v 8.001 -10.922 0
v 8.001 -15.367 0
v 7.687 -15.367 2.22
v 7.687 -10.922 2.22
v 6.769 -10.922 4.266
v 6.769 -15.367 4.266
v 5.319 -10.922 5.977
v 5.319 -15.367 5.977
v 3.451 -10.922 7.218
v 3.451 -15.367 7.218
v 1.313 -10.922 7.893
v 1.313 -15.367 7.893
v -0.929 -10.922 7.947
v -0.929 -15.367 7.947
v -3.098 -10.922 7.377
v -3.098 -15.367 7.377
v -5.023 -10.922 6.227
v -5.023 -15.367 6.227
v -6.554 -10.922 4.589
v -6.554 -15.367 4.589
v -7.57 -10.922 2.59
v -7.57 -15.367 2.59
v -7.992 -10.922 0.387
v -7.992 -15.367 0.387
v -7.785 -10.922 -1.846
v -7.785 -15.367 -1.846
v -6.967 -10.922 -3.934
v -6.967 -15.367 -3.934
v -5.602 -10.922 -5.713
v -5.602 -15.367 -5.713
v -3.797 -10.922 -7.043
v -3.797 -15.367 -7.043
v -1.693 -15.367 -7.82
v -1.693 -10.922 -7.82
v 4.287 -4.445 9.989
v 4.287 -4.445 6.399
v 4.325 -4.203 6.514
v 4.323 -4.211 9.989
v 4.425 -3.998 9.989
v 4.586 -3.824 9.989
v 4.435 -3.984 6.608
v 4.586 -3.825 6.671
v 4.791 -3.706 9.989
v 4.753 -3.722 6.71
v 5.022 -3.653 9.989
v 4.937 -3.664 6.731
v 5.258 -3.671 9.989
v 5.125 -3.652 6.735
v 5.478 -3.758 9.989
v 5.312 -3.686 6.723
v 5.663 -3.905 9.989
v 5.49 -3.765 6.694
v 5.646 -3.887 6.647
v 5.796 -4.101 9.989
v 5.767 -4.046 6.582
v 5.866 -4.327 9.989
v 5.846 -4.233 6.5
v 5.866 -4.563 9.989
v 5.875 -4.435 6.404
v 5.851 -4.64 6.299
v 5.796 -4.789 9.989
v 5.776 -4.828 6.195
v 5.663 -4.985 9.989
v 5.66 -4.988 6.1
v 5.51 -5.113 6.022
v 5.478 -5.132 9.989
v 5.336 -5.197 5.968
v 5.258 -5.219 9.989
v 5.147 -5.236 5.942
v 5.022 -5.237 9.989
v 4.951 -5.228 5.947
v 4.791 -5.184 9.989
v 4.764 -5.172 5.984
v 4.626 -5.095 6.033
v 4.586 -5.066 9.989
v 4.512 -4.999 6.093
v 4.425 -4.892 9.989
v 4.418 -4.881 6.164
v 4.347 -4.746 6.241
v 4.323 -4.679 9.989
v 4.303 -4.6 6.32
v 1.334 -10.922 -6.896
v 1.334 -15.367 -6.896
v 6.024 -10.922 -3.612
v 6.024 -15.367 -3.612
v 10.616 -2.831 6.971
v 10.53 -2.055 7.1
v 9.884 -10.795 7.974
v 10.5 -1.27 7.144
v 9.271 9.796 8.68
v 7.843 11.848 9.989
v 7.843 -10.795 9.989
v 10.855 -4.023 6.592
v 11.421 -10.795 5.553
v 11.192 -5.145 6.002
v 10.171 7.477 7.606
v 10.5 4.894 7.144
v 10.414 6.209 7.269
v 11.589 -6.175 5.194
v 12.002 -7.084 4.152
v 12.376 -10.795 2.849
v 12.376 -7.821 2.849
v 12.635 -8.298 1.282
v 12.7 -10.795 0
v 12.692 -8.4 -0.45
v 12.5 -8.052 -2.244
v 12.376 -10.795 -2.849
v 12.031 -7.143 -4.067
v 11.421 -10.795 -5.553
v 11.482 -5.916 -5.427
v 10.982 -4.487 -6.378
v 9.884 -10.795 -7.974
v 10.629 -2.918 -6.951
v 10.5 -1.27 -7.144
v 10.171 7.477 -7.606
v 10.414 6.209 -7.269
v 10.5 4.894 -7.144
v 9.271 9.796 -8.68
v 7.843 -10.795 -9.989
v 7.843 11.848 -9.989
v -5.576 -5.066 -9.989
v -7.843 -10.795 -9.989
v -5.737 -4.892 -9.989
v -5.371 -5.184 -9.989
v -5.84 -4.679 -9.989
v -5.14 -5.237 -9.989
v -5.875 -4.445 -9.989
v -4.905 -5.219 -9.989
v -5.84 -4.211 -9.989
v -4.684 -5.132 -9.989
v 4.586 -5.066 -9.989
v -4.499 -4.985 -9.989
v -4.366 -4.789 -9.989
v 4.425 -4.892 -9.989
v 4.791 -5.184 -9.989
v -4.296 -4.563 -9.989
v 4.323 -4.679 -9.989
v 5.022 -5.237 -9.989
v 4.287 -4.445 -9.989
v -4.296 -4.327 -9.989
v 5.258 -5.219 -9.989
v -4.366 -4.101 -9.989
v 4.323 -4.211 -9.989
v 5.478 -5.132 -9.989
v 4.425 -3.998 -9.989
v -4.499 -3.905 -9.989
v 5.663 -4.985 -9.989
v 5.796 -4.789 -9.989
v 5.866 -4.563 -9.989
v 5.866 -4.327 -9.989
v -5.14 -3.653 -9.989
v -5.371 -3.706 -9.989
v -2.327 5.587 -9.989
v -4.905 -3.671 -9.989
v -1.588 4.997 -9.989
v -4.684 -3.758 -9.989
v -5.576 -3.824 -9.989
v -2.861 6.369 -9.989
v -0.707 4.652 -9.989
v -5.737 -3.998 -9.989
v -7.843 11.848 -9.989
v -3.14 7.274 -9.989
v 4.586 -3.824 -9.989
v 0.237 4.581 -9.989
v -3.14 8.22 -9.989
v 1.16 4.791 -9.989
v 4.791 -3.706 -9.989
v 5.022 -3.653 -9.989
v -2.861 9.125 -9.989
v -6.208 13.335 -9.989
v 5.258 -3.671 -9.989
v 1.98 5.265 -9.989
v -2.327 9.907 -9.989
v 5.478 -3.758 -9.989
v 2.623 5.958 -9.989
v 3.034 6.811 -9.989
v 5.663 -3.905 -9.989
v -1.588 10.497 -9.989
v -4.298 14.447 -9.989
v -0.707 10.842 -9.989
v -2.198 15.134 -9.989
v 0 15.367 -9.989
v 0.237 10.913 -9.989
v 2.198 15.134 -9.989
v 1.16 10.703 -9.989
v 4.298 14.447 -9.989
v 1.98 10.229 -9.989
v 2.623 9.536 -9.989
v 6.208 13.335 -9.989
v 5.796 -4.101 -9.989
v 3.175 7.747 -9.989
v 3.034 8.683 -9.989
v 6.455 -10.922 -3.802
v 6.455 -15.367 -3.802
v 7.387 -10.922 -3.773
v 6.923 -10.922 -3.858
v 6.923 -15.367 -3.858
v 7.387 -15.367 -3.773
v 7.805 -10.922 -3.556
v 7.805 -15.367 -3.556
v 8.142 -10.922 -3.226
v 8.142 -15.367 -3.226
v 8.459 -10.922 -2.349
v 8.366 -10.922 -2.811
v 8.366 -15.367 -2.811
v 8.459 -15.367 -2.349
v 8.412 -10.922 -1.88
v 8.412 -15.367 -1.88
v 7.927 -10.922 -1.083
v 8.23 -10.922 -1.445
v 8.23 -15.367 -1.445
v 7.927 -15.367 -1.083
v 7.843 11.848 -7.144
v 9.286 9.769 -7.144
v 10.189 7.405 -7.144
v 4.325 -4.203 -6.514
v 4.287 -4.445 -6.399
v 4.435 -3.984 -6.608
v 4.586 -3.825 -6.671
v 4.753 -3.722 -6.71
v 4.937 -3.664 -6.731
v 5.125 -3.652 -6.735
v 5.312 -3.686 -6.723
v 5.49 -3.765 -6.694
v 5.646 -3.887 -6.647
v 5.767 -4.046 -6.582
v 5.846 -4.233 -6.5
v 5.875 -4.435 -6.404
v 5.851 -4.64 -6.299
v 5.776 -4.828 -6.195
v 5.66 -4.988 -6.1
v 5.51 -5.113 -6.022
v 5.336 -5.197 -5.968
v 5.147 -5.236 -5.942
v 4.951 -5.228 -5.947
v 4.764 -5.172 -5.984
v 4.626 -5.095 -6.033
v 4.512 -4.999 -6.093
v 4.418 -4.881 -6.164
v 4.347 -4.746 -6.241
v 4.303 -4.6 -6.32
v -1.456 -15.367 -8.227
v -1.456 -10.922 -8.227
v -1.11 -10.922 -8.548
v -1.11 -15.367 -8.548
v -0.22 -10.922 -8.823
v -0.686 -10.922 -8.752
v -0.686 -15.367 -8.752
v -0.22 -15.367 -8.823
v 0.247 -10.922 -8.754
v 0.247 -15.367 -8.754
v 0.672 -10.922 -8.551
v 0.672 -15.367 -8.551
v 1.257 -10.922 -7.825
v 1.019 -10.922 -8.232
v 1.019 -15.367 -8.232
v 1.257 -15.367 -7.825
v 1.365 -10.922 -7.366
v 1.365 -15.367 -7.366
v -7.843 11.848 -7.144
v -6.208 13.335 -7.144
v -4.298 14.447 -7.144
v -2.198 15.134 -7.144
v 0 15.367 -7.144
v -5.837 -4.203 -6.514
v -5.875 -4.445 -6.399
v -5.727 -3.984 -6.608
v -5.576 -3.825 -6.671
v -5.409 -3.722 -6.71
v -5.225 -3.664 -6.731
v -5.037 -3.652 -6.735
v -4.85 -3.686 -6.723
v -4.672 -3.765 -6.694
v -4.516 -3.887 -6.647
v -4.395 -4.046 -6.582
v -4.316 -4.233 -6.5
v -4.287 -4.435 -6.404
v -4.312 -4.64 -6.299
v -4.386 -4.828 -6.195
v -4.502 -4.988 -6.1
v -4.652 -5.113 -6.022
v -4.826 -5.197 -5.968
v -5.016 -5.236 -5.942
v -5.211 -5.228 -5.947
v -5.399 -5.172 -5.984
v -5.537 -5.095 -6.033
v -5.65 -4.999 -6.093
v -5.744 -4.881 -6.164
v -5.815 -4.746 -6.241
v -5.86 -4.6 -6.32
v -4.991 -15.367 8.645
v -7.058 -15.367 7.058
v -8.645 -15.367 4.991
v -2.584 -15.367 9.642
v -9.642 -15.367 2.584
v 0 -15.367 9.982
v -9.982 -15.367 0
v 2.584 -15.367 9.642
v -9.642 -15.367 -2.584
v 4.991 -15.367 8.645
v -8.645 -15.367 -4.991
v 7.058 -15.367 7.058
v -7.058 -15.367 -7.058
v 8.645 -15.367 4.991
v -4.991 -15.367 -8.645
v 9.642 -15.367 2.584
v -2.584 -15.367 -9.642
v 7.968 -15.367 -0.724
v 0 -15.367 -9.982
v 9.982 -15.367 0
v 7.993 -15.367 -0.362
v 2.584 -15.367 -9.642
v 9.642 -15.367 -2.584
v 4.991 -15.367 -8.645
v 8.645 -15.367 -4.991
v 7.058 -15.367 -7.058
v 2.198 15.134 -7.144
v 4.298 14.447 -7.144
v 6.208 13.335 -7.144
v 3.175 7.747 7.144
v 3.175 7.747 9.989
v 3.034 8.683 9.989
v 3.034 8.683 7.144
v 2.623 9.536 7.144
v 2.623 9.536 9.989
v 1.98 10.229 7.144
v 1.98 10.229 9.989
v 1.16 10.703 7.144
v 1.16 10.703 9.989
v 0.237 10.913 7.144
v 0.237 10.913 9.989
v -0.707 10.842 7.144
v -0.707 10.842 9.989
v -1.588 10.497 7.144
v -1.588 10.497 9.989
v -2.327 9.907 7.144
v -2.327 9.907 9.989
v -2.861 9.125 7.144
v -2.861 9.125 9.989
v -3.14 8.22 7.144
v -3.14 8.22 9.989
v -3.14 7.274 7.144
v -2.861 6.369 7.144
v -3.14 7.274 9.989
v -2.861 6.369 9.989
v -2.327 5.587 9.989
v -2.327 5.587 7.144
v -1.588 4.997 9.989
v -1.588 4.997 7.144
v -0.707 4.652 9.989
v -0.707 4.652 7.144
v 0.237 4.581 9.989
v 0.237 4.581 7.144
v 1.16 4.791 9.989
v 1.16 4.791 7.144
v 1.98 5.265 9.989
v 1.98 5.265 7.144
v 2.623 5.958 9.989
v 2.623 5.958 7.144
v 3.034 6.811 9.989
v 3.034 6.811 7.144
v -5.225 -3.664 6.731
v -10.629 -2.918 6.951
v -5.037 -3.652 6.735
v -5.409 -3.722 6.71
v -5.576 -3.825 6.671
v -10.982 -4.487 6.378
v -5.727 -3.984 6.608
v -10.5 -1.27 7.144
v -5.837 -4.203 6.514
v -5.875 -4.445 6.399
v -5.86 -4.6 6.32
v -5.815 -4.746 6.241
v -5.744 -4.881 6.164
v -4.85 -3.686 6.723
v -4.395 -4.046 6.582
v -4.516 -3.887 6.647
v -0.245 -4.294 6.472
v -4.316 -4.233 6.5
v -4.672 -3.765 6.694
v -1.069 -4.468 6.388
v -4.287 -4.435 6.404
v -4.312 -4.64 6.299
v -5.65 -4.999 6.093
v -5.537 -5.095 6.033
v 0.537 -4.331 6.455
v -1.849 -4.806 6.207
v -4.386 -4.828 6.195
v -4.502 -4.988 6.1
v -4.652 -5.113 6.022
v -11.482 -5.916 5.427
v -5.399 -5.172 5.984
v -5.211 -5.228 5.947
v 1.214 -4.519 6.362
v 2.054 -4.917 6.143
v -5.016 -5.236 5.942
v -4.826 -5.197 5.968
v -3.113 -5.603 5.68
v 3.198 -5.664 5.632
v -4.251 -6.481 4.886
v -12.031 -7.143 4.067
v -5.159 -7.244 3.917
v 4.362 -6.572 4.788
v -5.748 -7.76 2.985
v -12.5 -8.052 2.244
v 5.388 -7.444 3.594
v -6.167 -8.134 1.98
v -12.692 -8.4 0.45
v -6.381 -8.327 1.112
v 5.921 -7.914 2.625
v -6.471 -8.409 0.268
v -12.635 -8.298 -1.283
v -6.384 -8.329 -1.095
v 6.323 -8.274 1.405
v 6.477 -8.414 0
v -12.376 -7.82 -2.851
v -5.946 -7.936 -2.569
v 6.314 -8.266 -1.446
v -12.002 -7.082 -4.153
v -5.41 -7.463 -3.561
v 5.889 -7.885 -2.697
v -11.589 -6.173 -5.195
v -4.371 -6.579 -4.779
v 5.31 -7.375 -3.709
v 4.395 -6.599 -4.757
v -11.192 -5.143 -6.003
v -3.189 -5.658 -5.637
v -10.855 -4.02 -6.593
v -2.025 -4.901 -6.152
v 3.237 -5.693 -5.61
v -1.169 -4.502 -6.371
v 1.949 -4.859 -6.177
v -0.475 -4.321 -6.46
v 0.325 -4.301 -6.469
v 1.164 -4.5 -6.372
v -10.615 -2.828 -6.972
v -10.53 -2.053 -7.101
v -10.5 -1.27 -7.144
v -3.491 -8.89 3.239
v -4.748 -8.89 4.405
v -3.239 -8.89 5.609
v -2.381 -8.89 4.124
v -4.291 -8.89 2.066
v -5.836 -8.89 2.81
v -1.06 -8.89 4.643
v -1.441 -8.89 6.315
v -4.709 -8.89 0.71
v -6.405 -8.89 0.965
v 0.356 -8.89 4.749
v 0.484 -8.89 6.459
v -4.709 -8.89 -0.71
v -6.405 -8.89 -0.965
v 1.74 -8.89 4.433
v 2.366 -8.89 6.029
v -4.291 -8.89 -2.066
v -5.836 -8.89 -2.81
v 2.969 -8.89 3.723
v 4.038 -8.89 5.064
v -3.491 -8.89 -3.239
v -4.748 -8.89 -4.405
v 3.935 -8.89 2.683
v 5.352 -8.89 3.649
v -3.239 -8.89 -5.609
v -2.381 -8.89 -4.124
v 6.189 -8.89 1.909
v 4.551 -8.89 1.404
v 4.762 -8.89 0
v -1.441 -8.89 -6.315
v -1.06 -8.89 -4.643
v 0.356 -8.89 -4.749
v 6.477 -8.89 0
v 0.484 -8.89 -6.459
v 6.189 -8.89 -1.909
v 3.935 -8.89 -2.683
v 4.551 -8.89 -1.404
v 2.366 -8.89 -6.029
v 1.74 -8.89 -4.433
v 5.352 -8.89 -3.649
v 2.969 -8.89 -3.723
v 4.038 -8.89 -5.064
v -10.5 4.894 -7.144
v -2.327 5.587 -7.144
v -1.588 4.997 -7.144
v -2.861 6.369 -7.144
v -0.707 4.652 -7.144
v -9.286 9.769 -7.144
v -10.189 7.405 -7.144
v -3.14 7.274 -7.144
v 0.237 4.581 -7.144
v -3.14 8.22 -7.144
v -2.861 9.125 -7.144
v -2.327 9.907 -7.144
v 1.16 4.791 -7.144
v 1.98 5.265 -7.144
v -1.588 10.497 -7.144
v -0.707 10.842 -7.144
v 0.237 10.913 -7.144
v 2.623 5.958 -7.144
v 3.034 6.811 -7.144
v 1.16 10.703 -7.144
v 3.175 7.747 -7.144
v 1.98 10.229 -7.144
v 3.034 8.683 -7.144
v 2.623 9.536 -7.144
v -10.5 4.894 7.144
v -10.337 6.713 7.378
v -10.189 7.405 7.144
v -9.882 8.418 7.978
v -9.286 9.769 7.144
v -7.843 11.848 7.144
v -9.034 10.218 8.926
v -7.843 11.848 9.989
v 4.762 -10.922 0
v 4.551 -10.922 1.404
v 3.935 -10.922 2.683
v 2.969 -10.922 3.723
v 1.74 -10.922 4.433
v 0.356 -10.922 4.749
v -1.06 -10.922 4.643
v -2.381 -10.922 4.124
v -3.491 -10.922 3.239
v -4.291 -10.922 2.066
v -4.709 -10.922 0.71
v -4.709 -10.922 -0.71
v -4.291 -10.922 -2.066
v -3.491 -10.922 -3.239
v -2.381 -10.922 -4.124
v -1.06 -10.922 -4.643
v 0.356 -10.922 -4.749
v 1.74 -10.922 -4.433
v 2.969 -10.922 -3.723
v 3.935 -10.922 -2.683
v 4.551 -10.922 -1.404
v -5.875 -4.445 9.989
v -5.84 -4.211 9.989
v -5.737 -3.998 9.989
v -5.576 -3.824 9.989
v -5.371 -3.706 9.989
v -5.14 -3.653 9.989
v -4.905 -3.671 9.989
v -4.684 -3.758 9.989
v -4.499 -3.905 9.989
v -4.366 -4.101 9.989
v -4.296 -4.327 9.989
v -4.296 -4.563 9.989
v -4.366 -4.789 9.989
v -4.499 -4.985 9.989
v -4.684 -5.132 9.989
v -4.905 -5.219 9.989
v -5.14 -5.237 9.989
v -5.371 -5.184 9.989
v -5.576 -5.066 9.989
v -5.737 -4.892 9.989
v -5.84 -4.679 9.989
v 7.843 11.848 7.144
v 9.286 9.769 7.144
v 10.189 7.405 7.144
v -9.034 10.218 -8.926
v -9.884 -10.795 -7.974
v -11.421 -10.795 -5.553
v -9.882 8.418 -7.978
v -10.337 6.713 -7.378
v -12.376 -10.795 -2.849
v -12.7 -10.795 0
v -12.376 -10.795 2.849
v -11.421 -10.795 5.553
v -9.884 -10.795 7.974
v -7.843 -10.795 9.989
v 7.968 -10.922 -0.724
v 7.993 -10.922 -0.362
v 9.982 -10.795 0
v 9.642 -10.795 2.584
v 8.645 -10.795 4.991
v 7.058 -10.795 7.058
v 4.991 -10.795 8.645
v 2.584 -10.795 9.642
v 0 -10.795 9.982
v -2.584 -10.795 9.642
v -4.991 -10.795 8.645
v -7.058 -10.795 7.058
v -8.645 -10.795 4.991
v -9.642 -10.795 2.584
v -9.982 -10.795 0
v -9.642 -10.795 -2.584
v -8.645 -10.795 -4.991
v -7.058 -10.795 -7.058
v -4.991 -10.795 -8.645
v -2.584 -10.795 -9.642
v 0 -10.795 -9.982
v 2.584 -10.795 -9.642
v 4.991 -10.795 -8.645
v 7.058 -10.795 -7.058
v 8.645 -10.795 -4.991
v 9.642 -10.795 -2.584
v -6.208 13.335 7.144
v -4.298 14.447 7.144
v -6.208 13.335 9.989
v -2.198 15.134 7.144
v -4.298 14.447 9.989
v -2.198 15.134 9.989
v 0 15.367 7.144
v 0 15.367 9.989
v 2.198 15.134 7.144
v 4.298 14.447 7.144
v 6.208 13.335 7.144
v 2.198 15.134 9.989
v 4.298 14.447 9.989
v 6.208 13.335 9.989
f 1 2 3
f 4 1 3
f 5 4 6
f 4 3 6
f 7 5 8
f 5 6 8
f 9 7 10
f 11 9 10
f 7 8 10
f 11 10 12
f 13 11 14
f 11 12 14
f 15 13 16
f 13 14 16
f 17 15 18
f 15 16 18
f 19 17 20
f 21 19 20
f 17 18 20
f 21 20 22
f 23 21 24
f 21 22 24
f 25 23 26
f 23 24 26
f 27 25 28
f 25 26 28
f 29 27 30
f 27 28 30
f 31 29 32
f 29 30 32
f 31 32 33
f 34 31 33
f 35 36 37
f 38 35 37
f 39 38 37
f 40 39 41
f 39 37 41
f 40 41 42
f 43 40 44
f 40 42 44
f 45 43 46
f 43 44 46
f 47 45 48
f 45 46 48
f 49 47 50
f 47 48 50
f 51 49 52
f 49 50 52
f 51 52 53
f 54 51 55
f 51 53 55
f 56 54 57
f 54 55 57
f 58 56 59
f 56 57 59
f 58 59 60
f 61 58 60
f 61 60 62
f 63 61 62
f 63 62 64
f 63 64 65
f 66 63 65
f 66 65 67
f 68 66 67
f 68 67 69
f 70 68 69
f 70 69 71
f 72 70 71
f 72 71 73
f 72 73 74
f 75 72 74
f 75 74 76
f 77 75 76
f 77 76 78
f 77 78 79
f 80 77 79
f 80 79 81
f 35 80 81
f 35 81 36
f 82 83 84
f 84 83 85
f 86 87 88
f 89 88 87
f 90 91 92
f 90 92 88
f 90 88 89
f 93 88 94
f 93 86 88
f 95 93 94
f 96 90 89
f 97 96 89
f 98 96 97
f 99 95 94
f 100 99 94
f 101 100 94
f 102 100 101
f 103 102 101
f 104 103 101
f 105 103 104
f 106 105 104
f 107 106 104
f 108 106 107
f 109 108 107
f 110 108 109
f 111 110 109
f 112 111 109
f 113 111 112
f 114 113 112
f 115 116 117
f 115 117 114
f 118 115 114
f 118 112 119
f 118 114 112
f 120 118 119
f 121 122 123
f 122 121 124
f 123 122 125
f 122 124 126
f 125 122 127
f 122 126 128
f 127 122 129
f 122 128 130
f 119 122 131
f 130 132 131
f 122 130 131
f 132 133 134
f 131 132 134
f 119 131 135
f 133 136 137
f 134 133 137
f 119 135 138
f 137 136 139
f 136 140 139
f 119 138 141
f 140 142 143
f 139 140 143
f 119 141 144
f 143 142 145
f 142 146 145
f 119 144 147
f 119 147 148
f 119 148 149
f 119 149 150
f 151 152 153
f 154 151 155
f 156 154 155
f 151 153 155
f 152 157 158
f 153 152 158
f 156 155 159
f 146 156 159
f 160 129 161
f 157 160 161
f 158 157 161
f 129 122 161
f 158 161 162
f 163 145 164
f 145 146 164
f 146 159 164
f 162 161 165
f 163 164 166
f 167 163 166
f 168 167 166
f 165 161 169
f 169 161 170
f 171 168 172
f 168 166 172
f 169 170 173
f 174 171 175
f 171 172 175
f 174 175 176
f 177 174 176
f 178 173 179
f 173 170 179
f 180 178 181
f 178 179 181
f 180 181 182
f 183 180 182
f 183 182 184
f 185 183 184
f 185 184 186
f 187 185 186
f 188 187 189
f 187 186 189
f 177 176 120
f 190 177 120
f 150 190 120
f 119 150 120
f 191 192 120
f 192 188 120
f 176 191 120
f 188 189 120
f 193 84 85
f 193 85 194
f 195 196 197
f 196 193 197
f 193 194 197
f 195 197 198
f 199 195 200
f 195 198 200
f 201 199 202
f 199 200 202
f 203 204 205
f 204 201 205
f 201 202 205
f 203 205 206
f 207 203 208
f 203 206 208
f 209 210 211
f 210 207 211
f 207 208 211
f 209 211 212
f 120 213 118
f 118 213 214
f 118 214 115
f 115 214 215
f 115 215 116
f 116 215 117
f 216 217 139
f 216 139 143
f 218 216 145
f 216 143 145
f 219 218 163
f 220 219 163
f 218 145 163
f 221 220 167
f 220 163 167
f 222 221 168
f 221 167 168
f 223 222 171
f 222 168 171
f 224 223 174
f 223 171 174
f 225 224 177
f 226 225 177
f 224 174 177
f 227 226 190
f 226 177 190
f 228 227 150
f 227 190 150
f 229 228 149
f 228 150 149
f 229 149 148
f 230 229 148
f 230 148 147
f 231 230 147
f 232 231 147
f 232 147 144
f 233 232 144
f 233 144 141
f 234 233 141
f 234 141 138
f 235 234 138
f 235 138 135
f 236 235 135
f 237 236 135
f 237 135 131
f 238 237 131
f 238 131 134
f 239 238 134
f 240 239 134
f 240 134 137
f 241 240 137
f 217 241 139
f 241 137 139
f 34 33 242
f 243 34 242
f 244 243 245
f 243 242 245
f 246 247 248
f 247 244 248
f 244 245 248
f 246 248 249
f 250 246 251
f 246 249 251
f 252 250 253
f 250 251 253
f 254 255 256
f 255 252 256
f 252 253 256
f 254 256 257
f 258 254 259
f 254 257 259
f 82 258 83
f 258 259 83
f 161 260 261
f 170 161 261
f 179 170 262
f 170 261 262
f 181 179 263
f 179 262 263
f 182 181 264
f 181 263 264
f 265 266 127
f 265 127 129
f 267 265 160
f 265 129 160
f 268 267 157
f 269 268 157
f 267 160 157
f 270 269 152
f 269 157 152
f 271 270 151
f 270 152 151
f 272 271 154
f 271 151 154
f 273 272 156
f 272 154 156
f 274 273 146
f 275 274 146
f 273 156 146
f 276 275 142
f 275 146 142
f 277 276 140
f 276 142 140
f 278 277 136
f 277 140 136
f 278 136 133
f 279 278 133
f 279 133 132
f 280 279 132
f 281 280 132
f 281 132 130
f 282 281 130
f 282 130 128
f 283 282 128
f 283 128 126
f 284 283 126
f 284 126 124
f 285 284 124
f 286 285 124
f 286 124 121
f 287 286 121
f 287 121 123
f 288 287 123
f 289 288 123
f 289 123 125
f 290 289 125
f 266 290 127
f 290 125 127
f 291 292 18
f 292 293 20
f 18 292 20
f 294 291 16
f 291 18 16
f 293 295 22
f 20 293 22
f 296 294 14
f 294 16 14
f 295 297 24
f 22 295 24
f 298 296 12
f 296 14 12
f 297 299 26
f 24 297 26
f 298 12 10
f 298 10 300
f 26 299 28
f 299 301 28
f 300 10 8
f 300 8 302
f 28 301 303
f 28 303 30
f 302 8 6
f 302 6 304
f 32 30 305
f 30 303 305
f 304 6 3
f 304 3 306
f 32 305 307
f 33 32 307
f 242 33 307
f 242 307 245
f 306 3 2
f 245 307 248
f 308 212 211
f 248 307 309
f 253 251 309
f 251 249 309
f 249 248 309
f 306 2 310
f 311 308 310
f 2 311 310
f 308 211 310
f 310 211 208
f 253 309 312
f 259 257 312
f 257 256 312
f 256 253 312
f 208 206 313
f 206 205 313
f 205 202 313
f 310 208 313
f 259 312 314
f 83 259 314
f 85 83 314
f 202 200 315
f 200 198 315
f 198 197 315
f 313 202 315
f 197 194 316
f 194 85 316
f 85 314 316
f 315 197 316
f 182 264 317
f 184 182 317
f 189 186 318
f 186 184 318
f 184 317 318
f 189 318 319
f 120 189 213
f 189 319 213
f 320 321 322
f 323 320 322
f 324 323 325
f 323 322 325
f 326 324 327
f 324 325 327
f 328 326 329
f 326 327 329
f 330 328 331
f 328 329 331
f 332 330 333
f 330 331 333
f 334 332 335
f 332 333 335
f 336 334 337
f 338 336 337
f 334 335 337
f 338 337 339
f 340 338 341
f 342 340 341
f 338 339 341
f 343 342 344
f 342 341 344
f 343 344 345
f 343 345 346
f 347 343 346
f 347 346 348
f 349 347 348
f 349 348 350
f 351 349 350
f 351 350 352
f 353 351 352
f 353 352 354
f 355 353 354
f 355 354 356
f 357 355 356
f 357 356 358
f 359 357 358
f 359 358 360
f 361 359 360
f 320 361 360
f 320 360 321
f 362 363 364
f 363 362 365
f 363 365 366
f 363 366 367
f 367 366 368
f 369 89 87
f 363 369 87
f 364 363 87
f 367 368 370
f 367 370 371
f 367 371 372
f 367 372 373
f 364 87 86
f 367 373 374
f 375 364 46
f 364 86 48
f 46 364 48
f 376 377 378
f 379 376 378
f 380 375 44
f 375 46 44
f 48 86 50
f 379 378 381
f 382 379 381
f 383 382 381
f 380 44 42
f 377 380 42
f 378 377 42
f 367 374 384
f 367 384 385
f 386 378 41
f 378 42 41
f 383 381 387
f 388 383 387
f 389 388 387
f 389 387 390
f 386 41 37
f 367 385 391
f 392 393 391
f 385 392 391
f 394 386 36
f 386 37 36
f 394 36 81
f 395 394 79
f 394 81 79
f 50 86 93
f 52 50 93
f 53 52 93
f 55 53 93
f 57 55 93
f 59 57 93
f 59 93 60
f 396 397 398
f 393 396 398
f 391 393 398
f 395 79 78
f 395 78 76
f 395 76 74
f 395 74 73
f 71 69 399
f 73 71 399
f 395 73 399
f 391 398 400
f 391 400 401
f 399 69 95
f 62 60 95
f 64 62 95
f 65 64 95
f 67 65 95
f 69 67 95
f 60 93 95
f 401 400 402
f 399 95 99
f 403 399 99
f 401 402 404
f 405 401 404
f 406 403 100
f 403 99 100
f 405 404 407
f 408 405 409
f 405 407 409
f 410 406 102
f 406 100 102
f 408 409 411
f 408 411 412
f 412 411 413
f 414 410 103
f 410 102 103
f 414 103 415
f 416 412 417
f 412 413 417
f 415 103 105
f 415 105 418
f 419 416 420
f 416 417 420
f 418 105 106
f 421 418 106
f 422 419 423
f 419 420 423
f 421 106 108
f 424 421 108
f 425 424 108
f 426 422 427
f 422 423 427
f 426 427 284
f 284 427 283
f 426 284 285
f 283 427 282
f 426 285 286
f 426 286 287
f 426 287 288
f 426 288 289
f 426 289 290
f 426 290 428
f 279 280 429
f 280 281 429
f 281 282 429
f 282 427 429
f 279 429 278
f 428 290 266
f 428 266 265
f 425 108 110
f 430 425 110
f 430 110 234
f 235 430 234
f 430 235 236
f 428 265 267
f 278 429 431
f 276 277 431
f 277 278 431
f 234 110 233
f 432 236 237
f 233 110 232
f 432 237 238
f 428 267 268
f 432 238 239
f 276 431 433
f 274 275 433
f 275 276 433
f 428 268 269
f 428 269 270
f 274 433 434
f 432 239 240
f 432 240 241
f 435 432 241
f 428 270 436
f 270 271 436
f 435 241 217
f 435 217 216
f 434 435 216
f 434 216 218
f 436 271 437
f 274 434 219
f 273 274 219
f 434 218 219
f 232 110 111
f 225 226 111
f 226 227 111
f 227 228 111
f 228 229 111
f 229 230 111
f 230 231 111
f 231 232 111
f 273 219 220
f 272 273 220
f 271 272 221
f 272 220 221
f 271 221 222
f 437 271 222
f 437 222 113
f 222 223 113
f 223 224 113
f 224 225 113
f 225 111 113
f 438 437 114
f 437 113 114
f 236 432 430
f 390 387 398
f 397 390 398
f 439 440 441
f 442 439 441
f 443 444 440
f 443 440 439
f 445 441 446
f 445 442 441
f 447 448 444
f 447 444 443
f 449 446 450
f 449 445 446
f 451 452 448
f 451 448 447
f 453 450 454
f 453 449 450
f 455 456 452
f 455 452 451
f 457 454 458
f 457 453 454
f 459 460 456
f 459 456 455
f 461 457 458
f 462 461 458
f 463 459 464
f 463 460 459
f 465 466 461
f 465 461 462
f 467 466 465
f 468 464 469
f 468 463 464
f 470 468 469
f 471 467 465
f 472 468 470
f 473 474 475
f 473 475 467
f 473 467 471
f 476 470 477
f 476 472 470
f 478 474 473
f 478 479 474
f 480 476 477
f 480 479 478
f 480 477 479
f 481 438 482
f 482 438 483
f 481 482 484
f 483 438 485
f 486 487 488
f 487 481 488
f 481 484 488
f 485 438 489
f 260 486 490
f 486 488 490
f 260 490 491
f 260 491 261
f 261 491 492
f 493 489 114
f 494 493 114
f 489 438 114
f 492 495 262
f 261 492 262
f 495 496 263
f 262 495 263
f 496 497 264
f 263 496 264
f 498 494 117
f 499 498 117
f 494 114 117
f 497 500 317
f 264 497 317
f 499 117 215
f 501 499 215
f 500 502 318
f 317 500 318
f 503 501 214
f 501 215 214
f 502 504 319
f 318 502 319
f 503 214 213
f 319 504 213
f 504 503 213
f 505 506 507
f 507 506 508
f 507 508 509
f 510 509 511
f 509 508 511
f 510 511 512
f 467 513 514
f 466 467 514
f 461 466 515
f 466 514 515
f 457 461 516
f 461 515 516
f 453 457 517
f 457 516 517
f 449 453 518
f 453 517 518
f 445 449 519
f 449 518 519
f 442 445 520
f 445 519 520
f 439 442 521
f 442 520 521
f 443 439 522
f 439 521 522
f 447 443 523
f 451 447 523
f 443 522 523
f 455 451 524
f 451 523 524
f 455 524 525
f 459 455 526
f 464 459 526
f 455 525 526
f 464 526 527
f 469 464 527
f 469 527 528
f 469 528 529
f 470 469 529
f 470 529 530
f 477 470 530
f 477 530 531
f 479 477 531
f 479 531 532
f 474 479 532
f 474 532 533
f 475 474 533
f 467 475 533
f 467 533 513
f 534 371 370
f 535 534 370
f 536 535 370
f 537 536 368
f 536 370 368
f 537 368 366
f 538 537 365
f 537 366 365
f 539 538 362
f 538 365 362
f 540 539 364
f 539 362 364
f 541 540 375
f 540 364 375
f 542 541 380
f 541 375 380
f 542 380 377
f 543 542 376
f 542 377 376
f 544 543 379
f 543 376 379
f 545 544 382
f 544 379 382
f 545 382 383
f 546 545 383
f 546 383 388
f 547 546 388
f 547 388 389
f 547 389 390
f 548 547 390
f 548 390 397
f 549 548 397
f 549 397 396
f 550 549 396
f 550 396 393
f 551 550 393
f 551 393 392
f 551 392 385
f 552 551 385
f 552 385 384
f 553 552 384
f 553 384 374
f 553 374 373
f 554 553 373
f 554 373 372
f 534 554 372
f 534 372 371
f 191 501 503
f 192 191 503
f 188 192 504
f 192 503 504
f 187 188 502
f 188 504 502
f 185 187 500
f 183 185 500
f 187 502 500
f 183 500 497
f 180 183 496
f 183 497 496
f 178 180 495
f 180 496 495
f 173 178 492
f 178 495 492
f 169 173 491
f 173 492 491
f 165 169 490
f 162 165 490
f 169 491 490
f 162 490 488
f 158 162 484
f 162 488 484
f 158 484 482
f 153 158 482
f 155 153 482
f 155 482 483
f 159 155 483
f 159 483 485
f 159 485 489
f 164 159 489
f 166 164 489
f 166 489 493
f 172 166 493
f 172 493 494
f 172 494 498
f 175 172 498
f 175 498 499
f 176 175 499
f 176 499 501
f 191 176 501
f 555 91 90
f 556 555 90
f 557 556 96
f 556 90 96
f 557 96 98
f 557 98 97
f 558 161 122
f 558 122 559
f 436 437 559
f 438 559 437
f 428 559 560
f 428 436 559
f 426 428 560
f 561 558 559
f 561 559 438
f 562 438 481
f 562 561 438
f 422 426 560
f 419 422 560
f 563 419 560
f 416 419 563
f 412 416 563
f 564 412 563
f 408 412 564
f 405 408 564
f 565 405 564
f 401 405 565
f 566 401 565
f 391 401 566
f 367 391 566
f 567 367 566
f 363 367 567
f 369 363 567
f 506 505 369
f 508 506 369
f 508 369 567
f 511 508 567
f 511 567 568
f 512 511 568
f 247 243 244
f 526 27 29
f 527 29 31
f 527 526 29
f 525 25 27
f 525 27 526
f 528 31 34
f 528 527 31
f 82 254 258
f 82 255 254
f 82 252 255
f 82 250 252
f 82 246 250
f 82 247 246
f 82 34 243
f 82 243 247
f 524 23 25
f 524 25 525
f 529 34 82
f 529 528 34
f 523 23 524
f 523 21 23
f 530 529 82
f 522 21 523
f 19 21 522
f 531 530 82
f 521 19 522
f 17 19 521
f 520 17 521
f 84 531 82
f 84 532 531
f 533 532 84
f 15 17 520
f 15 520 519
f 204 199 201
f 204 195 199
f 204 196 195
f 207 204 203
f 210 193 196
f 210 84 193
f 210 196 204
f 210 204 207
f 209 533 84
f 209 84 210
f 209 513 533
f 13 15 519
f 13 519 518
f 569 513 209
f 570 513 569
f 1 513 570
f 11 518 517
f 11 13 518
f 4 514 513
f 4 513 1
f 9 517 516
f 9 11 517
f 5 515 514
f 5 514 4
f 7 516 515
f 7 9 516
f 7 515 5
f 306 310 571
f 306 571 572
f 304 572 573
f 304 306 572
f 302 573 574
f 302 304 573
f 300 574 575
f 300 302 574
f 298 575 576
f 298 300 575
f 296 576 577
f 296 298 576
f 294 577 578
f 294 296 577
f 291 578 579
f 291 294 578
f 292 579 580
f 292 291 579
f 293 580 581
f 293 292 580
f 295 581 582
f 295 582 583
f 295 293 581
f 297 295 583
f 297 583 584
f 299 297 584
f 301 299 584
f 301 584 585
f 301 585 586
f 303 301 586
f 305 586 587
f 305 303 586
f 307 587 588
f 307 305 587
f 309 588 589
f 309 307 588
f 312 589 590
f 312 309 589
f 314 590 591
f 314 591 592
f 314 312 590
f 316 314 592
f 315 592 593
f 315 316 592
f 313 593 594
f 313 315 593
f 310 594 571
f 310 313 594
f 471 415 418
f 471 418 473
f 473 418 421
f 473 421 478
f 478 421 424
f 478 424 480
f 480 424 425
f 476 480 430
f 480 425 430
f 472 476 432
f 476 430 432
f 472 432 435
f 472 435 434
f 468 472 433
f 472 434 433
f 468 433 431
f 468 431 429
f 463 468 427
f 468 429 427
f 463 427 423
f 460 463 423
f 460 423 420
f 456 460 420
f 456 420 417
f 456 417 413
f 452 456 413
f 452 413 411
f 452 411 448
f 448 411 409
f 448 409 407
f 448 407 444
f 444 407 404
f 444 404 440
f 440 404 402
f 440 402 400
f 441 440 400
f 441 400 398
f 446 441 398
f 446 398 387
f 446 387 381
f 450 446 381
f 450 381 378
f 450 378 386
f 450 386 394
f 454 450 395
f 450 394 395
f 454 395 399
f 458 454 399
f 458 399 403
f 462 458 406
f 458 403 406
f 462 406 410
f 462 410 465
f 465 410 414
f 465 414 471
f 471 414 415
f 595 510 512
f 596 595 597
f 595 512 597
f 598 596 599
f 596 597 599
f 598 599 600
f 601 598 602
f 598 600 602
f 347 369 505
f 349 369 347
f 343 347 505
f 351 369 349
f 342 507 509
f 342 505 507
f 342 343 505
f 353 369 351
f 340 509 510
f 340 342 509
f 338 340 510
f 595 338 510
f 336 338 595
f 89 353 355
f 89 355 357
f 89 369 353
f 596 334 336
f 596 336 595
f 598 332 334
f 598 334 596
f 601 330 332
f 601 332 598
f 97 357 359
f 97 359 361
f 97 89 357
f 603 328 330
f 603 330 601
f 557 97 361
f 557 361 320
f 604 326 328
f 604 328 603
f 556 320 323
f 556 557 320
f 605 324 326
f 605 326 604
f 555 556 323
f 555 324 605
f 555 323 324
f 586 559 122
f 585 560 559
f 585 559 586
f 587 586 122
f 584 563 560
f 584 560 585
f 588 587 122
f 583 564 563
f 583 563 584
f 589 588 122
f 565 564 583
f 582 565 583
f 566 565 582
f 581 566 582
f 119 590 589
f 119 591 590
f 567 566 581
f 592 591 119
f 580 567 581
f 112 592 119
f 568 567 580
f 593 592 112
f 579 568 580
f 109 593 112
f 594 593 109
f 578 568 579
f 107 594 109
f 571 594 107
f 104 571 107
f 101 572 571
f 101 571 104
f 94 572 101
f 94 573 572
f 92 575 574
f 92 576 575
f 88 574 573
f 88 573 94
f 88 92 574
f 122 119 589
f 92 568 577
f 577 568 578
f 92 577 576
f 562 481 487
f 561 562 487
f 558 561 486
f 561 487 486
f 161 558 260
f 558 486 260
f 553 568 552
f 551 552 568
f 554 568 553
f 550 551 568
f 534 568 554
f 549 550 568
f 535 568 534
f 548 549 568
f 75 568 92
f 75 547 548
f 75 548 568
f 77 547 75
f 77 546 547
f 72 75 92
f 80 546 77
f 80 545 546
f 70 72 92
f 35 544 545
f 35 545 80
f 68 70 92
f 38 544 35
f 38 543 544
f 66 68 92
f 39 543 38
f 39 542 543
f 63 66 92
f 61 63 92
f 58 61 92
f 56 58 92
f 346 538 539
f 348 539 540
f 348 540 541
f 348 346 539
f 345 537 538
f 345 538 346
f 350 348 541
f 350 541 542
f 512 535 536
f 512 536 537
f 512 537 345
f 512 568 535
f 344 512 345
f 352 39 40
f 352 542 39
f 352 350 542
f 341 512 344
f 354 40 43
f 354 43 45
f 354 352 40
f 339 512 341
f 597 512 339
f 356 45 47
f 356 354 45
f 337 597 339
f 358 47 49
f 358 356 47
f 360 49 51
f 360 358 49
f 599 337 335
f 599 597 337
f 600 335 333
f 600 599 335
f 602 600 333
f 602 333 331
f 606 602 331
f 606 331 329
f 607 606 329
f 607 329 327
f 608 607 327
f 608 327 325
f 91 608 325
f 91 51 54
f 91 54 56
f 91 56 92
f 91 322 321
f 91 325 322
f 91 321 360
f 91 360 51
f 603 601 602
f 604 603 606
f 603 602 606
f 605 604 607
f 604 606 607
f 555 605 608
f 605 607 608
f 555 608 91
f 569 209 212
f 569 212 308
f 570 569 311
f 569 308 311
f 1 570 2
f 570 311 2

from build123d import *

# Parameters (mm, degrees)
SKETCH1_R                = 12.7
BOSS_EXTRUDE1_DEPTH      = 15.367
BOSS_EXTRUDE1_DEPTH_BACK = 15.367
SKETCH4_W                = 25.4
SKETCH4_H                = 30.734
CUT_EXTRUDE2_DEPTH       = 3.71145
SKETCH5_W                = 14.2875
SKETCH5_H                = 16.637
CUT_EXTRUDE3_DEPTH       = 13.7
CUT_EXTRUDE3_DEPTH_BACK  = 13.7
CUT_EXTRUDE4_DEPTH       = 20.9771001
SKETCH7_R                = 4.7625
CUT_EXTRUDE5_DEPTH       = 31.7340001
SKETCH9_R                = 17.852773039
SKETCH9_R_2              = 9.9822
CUT_EXTRUDE6_DEPTH       = 4.572
SKETCH10_R               = 6.477
CUT_EXTRUDE7_DEPTH       = 24.257
SKETCH11_R               = 3.175
CUT_EXTRUDE8_DEPTH       = 20.9771001
SKETCH12_R               = 0.79375
CUT_EXTRUDE9_DEPTH       = 1.0000001
CUT_EXTRUDE9_DEPTH_BACK  = 20.9771001
SKETCH15_R               = 4.7625
CUT_EXTRUDE12_DEPTH      = 4.445
SKETCH16_R               = 1.5875
CUT_EXTRUDE13_DEPTH      = 4.445


with BuildPart() as part:
    # Sketch1 → Boss-Extrude1 (new body, two sides)
    with BuildSketch(Plane(origin=(0, 0, 0), x_dir=(1, 0, 0), z_dir=(0, 1, 0))) as boss_extrude1_sk:
        Circle(SKETCH1_R)
    extrude(amount=BOSS_EXTRUDE1_DEPTH)
    extrude(boss_extrude1_sk.sketch, amount=-BOSS_EXTRUDE1_DEPTH_BACK)

    # Sketch4 → Cut-Extrude2 (cut, through all)
    with BuildSketch(Plane.XY.offset(9.98855)):
        Rectangle(SKETCH4_W, SKETCH4_H)
    cut_extrude2 = extrude(amount=CUT_EXTRUDE2_DEPTH, mode=Mode.SUBTRACT)

    # Mirror2: Cut-Extrude2 across plane
    add(cut_extrude2.mirror(Plane.XY), mode=Mode.SUBTRACT)

    # Sketch5 → Cut-Extrude3 (cut, two sides)
    with BuildSketch(Plane(origin=(0, 0, 0), x_dir=(0, 0, -1), z_dir=(1, 0, 0))) as cut_extrude3_sk:
        with Locations((0, 7.0485)):
            Rectangle(SKETCH5_W, SKETCH5_H)
        with BuildLine():
            Line((7.14375, -1.27), (-7.14375, -1.27))
            ThreePointArc((-7.14375, -1.27), (0, -8.41375), (7.14375, -1.27))
        make_face()
    extrude(amount=CUT_EXTRUDE3_DEPTH, mode=Mode.SUBTRACT)
    extrude(cut_extrude3_sk.sketch, amount=-CUT_EXTRUDE3_DEPTH_BACK, mode=Mode.SUBTRACT)

    # Sketch6 → Cut-Extrude4 (cut, through all)
    with BuildSketch(Plane.XY.offset(9.98855)):
        with BuildLine():
            ThreePointArc((7.843396515, 11.847950137), (9.813665145, 8.601547837), (10.50036, 4.86664))
            Line((10.50036, 4.86664), (14.849727138, 4.86664))
            ThreePointArc((14.849727138, 4.86664), (0, 19.716367138), (-14.849727138, 4.86664))
            Line((-14.849727138, 4.86664), (-10.50036, 4.86664))
            ThreePointArc((-10.50036, 4.86664), (-9.813665145, 8.601547837), (-7.843396515, 11.847950137))
            Line((-7.843396515, 11.847950137), (-7.843396515, 15.367))
            Line((-7.843396515, 15.367), (0, 15.367))
            Line((0, 15.367), (7.843396515, 15.367))
            Line((7.843396515, 15.367), (7.843396515, 11.847950137))
        make_face()
        with BuildLine():
            ThreePointArc((-7.843396515, 11.847950137), (-4.298330514, 14.446927831), (0, 15.367))
            Line((0, 15.367), (-7.843396515, 15.367))
            Line((-7.843396515, 15.367), (-7.843396515, 11.847950137))
        make_face()
        with BuildLine():
            ThreePointArc((0, 15.367), (4.298330514, 14.446927831), (7.843396515, 11.847950137))
            Line((7.843396515, 11.847950137), (7.843396515, 15.367))
            Line((7.843396515, 15.367), (0, 15.367))
        make_face()
    extrude(amount=-CUT_EXTRUDE4_DEPTH, mode=Mode.SUBTRACT)

    # Sketch7 → Cut-Extrude5 (cut, through all)
    with BuildSketch(Plane.XZ.offset(15.367)):
        Circle(SKETCH7_R)
    extrude(amount=-CUT_EXTRUDE5_DEPTH, mode=Mode.SUBTRACT)

    # Sketch9 → Cut-Extrude6 (cut)
    with BuildSketch(Plane.XZ.offset(15.367)):
        Circle(SKETCH9_R)
        Circle(SKETCH9_R_2, mode=Mode.SUBTRACT)
    extrude(amount=-CUT_EXTRUDE6_DEPTH, mode=Mode.SUBTRACT)

    # Sketch10 → Cut-Extrude7 (cut)
    with BuildSketch(Plane(origin=(0, 15.367, 0), x_dir=(1, 0, 0), z_dir=(0, 1, 0))):
        Circle(SKETCH10_R)
    extrude(amount=-CUT_EXTRUDE7_DEPTH, mode=Mode.SUBTRACT)

    # Sketch11 → Cut-Extrude8 (cut, through all)
    with BuildSketch(Plane.XY.offset(9.98855)):
        with Locations((0, 7.747)):
            Circle(SKETCH11_R)
    extrude(amount=-CUT_EXTRUDE8_DEPTH, mode=Mode.SUBTRACT)

    # Sketch12 → Cut-Extrude9 (cut, two sides)
    with BuildSketch(Plane(origin=(0, 0, -9.98855), x_dir=(-1, 0, 0), z_dir=(0, 0, -1))) as cut_extrude9_sk:
        with Locations((5.081146515, -4.445)):
            Circle(SKETCH12_R)
        with Locations((-5.081146515, -4.445)):
            Circle(SKETCH12_R)
    extrude(amount=CUT_EXTRUDE9_DEPTH, mode=Mode.SUBTRACT)
    extrude(cut_extrude9_sk.sketch, amount=-CUT_EXTRUDE9_DEPTH_BACK, mode=Mode.SUBTRACT)

    # Sketch15 → Cut-Extrude12 (cut)
    with BuildSketch(Plane.XZ.offset(15.367)):
        with BuildLine():
            ThreePointArc((8.001, 0), (-5.572105758, 5.741745241), (-0.239879494, -7.997403255))
            Line((-0.239879494, -7.997403255), (7.597144444, -2.509860017))
            ThreePointArc((7.597144444, -2.509860017), (7.899390916, -1.271072049), (8.001, 0))
        make_face()
        Circle(SKETCH15_R, mode=Mode.SUBTRACT)
    extrude(amount=-CUT_EXTRUDE12_DEPTH, mode=Mode.SUBTRACT)

    # Sketch16 → Cut-Extrude13 (cut)
    with BuildSketch(Plane.XZ.offset(15.367)):
        with Locations((-0.217023554, -7.235403255)):
            Circle(SKETCH16_R)
        with Locations((6.873606877, -2.270825729)):
            Circle(SKETCH16_R)
    extrude(amount=-CUT_EXTRUDE13_DEPTH, mode=Mode.SUBTRACT)


solid = part.part
